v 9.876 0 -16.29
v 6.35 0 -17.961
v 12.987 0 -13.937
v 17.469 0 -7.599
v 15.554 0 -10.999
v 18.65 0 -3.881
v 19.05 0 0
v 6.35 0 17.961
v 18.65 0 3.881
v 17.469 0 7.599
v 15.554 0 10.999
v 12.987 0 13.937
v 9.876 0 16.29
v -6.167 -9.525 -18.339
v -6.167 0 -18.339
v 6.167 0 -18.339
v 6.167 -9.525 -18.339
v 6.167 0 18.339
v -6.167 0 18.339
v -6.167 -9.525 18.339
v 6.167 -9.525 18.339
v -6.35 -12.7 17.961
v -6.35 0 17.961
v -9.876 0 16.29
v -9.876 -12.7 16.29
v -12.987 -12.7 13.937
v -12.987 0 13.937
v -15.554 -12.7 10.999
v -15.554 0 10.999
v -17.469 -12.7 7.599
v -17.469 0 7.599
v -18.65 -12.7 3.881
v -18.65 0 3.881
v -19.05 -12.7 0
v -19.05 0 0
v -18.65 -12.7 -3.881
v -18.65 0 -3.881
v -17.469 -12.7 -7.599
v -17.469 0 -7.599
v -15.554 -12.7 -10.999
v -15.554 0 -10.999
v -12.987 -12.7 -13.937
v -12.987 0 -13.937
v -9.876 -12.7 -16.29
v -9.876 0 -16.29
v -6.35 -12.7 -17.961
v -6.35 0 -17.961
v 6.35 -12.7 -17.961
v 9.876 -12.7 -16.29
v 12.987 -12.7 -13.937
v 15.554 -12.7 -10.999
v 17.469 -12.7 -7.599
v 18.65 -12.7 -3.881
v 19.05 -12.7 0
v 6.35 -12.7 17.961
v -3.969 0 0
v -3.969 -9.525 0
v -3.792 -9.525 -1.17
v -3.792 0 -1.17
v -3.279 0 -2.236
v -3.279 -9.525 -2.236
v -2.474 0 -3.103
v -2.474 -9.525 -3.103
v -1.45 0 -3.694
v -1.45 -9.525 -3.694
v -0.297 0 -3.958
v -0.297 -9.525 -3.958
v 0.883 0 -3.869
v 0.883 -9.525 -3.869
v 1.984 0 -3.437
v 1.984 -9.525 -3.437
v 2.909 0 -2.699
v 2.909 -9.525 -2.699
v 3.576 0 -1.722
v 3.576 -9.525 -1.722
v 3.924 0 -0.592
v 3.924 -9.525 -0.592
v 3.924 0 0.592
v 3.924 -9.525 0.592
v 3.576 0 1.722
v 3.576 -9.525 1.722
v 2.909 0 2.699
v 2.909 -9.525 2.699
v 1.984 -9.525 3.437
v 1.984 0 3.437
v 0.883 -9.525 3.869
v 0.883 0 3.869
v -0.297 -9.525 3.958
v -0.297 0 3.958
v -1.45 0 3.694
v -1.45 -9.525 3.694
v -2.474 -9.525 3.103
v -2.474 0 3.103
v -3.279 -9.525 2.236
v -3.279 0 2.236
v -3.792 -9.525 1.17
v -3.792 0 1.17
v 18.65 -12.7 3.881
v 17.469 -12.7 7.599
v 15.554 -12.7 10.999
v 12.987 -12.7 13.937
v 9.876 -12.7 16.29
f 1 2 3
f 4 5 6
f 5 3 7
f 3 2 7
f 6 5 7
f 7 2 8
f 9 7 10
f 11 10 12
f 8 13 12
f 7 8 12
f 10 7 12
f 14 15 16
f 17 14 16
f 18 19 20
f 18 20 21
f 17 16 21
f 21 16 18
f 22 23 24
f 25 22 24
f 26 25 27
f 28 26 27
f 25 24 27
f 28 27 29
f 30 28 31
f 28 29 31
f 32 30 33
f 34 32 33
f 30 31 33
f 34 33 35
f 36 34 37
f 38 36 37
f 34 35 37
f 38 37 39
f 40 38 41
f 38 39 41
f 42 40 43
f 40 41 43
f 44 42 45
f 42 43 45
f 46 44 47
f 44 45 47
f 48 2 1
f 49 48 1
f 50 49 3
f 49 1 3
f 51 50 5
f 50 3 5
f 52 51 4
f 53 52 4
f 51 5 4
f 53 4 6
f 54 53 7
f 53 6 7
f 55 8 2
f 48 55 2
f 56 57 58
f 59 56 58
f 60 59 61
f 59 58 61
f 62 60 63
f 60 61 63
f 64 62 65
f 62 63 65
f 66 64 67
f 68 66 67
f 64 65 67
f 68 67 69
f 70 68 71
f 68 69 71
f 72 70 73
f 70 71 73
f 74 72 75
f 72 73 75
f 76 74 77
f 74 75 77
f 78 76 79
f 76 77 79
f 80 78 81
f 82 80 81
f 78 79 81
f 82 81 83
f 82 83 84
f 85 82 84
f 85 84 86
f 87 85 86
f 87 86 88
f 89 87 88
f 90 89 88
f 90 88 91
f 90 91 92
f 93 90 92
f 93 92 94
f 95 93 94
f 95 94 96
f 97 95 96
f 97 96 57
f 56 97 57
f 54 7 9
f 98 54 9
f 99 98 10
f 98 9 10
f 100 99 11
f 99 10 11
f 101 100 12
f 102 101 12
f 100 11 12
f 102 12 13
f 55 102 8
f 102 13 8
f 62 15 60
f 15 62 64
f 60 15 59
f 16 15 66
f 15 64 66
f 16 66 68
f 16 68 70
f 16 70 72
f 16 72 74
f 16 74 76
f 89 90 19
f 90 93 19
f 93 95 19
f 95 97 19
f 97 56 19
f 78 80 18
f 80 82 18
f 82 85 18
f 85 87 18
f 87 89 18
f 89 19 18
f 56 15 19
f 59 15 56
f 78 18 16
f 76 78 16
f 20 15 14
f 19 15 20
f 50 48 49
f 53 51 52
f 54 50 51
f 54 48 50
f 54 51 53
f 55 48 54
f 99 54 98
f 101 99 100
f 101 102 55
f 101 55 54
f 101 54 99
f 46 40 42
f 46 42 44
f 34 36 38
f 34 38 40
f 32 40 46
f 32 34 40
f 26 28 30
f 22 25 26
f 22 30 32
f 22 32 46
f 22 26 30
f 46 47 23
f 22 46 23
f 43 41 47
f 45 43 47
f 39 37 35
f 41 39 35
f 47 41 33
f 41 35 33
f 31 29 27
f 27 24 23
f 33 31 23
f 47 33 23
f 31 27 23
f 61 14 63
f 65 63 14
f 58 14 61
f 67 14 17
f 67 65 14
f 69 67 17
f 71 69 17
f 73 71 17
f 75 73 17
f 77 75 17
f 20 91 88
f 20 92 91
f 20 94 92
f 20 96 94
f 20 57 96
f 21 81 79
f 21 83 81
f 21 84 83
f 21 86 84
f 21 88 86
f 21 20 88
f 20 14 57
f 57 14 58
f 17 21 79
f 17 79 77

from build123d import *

# Parameters (mm, degrees)
F1_DEPTH = 12.7
F2_W     = 12.334196
F2_H     = 36.678012
F4_DEPTH = 9.525
F5_D     = 7.9375


with BuildPart() as f1:
    # F0 (on Front) → F1 (new body)
    with BuildSketch(Plane.XZ):
        with BuildLine():
            ThreePointArc((6.35, -17.960512), (15.55426, -10.998523), (19.05, 0))
            ThreePointArc((19.05, 0), (15.55426, 10.998523), (6.35, 17.960512))
            Line((6.35, 17.960512), (6.35, -17.960512))
        make_face()
        with BuildLine():
            Line((-6.35, -17.960512), (-6.35, 17.960512))
            ThreePointArc((-6.35, 17.960512), (-19.05, 0), (-6.35, -17.960512))
        make_face()
    extrude(amount=F1_DEPTH)


with BuildPart() as f4:
    # F2 (on Front) → F4 (new body)
    with BuildSketch(Plane.XZ):
        Rectangle(F2_W, F2_H)
    extrude(amount=F4_DEPTH)

    # F5 (through all)
    with Locations(Plane(origin=(0, 0, 0), x_dir=(1, 0, 0), z_dir=(0, 1, 0))):
        with Locations((0, 0)):
            Hole(F5_D / 2)


solid = Compound([f1.part, f4.part])
